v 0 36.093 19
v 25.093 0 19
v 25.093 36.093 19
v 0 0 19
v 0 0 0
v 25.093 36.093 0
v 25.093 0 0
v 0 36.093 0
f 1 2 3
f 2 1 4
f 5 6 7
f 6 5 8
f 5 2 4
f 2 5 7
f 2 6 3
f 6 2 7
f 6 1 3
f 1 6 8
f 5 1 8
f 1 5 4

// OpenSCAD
cube([25.09336, 36.09336, 19]);
translate([1.082, 0.865, 0])
    linear_extrude(height = 23.56, convexity = 5)
        import(file = "victoire.dxf", layer = "0");
